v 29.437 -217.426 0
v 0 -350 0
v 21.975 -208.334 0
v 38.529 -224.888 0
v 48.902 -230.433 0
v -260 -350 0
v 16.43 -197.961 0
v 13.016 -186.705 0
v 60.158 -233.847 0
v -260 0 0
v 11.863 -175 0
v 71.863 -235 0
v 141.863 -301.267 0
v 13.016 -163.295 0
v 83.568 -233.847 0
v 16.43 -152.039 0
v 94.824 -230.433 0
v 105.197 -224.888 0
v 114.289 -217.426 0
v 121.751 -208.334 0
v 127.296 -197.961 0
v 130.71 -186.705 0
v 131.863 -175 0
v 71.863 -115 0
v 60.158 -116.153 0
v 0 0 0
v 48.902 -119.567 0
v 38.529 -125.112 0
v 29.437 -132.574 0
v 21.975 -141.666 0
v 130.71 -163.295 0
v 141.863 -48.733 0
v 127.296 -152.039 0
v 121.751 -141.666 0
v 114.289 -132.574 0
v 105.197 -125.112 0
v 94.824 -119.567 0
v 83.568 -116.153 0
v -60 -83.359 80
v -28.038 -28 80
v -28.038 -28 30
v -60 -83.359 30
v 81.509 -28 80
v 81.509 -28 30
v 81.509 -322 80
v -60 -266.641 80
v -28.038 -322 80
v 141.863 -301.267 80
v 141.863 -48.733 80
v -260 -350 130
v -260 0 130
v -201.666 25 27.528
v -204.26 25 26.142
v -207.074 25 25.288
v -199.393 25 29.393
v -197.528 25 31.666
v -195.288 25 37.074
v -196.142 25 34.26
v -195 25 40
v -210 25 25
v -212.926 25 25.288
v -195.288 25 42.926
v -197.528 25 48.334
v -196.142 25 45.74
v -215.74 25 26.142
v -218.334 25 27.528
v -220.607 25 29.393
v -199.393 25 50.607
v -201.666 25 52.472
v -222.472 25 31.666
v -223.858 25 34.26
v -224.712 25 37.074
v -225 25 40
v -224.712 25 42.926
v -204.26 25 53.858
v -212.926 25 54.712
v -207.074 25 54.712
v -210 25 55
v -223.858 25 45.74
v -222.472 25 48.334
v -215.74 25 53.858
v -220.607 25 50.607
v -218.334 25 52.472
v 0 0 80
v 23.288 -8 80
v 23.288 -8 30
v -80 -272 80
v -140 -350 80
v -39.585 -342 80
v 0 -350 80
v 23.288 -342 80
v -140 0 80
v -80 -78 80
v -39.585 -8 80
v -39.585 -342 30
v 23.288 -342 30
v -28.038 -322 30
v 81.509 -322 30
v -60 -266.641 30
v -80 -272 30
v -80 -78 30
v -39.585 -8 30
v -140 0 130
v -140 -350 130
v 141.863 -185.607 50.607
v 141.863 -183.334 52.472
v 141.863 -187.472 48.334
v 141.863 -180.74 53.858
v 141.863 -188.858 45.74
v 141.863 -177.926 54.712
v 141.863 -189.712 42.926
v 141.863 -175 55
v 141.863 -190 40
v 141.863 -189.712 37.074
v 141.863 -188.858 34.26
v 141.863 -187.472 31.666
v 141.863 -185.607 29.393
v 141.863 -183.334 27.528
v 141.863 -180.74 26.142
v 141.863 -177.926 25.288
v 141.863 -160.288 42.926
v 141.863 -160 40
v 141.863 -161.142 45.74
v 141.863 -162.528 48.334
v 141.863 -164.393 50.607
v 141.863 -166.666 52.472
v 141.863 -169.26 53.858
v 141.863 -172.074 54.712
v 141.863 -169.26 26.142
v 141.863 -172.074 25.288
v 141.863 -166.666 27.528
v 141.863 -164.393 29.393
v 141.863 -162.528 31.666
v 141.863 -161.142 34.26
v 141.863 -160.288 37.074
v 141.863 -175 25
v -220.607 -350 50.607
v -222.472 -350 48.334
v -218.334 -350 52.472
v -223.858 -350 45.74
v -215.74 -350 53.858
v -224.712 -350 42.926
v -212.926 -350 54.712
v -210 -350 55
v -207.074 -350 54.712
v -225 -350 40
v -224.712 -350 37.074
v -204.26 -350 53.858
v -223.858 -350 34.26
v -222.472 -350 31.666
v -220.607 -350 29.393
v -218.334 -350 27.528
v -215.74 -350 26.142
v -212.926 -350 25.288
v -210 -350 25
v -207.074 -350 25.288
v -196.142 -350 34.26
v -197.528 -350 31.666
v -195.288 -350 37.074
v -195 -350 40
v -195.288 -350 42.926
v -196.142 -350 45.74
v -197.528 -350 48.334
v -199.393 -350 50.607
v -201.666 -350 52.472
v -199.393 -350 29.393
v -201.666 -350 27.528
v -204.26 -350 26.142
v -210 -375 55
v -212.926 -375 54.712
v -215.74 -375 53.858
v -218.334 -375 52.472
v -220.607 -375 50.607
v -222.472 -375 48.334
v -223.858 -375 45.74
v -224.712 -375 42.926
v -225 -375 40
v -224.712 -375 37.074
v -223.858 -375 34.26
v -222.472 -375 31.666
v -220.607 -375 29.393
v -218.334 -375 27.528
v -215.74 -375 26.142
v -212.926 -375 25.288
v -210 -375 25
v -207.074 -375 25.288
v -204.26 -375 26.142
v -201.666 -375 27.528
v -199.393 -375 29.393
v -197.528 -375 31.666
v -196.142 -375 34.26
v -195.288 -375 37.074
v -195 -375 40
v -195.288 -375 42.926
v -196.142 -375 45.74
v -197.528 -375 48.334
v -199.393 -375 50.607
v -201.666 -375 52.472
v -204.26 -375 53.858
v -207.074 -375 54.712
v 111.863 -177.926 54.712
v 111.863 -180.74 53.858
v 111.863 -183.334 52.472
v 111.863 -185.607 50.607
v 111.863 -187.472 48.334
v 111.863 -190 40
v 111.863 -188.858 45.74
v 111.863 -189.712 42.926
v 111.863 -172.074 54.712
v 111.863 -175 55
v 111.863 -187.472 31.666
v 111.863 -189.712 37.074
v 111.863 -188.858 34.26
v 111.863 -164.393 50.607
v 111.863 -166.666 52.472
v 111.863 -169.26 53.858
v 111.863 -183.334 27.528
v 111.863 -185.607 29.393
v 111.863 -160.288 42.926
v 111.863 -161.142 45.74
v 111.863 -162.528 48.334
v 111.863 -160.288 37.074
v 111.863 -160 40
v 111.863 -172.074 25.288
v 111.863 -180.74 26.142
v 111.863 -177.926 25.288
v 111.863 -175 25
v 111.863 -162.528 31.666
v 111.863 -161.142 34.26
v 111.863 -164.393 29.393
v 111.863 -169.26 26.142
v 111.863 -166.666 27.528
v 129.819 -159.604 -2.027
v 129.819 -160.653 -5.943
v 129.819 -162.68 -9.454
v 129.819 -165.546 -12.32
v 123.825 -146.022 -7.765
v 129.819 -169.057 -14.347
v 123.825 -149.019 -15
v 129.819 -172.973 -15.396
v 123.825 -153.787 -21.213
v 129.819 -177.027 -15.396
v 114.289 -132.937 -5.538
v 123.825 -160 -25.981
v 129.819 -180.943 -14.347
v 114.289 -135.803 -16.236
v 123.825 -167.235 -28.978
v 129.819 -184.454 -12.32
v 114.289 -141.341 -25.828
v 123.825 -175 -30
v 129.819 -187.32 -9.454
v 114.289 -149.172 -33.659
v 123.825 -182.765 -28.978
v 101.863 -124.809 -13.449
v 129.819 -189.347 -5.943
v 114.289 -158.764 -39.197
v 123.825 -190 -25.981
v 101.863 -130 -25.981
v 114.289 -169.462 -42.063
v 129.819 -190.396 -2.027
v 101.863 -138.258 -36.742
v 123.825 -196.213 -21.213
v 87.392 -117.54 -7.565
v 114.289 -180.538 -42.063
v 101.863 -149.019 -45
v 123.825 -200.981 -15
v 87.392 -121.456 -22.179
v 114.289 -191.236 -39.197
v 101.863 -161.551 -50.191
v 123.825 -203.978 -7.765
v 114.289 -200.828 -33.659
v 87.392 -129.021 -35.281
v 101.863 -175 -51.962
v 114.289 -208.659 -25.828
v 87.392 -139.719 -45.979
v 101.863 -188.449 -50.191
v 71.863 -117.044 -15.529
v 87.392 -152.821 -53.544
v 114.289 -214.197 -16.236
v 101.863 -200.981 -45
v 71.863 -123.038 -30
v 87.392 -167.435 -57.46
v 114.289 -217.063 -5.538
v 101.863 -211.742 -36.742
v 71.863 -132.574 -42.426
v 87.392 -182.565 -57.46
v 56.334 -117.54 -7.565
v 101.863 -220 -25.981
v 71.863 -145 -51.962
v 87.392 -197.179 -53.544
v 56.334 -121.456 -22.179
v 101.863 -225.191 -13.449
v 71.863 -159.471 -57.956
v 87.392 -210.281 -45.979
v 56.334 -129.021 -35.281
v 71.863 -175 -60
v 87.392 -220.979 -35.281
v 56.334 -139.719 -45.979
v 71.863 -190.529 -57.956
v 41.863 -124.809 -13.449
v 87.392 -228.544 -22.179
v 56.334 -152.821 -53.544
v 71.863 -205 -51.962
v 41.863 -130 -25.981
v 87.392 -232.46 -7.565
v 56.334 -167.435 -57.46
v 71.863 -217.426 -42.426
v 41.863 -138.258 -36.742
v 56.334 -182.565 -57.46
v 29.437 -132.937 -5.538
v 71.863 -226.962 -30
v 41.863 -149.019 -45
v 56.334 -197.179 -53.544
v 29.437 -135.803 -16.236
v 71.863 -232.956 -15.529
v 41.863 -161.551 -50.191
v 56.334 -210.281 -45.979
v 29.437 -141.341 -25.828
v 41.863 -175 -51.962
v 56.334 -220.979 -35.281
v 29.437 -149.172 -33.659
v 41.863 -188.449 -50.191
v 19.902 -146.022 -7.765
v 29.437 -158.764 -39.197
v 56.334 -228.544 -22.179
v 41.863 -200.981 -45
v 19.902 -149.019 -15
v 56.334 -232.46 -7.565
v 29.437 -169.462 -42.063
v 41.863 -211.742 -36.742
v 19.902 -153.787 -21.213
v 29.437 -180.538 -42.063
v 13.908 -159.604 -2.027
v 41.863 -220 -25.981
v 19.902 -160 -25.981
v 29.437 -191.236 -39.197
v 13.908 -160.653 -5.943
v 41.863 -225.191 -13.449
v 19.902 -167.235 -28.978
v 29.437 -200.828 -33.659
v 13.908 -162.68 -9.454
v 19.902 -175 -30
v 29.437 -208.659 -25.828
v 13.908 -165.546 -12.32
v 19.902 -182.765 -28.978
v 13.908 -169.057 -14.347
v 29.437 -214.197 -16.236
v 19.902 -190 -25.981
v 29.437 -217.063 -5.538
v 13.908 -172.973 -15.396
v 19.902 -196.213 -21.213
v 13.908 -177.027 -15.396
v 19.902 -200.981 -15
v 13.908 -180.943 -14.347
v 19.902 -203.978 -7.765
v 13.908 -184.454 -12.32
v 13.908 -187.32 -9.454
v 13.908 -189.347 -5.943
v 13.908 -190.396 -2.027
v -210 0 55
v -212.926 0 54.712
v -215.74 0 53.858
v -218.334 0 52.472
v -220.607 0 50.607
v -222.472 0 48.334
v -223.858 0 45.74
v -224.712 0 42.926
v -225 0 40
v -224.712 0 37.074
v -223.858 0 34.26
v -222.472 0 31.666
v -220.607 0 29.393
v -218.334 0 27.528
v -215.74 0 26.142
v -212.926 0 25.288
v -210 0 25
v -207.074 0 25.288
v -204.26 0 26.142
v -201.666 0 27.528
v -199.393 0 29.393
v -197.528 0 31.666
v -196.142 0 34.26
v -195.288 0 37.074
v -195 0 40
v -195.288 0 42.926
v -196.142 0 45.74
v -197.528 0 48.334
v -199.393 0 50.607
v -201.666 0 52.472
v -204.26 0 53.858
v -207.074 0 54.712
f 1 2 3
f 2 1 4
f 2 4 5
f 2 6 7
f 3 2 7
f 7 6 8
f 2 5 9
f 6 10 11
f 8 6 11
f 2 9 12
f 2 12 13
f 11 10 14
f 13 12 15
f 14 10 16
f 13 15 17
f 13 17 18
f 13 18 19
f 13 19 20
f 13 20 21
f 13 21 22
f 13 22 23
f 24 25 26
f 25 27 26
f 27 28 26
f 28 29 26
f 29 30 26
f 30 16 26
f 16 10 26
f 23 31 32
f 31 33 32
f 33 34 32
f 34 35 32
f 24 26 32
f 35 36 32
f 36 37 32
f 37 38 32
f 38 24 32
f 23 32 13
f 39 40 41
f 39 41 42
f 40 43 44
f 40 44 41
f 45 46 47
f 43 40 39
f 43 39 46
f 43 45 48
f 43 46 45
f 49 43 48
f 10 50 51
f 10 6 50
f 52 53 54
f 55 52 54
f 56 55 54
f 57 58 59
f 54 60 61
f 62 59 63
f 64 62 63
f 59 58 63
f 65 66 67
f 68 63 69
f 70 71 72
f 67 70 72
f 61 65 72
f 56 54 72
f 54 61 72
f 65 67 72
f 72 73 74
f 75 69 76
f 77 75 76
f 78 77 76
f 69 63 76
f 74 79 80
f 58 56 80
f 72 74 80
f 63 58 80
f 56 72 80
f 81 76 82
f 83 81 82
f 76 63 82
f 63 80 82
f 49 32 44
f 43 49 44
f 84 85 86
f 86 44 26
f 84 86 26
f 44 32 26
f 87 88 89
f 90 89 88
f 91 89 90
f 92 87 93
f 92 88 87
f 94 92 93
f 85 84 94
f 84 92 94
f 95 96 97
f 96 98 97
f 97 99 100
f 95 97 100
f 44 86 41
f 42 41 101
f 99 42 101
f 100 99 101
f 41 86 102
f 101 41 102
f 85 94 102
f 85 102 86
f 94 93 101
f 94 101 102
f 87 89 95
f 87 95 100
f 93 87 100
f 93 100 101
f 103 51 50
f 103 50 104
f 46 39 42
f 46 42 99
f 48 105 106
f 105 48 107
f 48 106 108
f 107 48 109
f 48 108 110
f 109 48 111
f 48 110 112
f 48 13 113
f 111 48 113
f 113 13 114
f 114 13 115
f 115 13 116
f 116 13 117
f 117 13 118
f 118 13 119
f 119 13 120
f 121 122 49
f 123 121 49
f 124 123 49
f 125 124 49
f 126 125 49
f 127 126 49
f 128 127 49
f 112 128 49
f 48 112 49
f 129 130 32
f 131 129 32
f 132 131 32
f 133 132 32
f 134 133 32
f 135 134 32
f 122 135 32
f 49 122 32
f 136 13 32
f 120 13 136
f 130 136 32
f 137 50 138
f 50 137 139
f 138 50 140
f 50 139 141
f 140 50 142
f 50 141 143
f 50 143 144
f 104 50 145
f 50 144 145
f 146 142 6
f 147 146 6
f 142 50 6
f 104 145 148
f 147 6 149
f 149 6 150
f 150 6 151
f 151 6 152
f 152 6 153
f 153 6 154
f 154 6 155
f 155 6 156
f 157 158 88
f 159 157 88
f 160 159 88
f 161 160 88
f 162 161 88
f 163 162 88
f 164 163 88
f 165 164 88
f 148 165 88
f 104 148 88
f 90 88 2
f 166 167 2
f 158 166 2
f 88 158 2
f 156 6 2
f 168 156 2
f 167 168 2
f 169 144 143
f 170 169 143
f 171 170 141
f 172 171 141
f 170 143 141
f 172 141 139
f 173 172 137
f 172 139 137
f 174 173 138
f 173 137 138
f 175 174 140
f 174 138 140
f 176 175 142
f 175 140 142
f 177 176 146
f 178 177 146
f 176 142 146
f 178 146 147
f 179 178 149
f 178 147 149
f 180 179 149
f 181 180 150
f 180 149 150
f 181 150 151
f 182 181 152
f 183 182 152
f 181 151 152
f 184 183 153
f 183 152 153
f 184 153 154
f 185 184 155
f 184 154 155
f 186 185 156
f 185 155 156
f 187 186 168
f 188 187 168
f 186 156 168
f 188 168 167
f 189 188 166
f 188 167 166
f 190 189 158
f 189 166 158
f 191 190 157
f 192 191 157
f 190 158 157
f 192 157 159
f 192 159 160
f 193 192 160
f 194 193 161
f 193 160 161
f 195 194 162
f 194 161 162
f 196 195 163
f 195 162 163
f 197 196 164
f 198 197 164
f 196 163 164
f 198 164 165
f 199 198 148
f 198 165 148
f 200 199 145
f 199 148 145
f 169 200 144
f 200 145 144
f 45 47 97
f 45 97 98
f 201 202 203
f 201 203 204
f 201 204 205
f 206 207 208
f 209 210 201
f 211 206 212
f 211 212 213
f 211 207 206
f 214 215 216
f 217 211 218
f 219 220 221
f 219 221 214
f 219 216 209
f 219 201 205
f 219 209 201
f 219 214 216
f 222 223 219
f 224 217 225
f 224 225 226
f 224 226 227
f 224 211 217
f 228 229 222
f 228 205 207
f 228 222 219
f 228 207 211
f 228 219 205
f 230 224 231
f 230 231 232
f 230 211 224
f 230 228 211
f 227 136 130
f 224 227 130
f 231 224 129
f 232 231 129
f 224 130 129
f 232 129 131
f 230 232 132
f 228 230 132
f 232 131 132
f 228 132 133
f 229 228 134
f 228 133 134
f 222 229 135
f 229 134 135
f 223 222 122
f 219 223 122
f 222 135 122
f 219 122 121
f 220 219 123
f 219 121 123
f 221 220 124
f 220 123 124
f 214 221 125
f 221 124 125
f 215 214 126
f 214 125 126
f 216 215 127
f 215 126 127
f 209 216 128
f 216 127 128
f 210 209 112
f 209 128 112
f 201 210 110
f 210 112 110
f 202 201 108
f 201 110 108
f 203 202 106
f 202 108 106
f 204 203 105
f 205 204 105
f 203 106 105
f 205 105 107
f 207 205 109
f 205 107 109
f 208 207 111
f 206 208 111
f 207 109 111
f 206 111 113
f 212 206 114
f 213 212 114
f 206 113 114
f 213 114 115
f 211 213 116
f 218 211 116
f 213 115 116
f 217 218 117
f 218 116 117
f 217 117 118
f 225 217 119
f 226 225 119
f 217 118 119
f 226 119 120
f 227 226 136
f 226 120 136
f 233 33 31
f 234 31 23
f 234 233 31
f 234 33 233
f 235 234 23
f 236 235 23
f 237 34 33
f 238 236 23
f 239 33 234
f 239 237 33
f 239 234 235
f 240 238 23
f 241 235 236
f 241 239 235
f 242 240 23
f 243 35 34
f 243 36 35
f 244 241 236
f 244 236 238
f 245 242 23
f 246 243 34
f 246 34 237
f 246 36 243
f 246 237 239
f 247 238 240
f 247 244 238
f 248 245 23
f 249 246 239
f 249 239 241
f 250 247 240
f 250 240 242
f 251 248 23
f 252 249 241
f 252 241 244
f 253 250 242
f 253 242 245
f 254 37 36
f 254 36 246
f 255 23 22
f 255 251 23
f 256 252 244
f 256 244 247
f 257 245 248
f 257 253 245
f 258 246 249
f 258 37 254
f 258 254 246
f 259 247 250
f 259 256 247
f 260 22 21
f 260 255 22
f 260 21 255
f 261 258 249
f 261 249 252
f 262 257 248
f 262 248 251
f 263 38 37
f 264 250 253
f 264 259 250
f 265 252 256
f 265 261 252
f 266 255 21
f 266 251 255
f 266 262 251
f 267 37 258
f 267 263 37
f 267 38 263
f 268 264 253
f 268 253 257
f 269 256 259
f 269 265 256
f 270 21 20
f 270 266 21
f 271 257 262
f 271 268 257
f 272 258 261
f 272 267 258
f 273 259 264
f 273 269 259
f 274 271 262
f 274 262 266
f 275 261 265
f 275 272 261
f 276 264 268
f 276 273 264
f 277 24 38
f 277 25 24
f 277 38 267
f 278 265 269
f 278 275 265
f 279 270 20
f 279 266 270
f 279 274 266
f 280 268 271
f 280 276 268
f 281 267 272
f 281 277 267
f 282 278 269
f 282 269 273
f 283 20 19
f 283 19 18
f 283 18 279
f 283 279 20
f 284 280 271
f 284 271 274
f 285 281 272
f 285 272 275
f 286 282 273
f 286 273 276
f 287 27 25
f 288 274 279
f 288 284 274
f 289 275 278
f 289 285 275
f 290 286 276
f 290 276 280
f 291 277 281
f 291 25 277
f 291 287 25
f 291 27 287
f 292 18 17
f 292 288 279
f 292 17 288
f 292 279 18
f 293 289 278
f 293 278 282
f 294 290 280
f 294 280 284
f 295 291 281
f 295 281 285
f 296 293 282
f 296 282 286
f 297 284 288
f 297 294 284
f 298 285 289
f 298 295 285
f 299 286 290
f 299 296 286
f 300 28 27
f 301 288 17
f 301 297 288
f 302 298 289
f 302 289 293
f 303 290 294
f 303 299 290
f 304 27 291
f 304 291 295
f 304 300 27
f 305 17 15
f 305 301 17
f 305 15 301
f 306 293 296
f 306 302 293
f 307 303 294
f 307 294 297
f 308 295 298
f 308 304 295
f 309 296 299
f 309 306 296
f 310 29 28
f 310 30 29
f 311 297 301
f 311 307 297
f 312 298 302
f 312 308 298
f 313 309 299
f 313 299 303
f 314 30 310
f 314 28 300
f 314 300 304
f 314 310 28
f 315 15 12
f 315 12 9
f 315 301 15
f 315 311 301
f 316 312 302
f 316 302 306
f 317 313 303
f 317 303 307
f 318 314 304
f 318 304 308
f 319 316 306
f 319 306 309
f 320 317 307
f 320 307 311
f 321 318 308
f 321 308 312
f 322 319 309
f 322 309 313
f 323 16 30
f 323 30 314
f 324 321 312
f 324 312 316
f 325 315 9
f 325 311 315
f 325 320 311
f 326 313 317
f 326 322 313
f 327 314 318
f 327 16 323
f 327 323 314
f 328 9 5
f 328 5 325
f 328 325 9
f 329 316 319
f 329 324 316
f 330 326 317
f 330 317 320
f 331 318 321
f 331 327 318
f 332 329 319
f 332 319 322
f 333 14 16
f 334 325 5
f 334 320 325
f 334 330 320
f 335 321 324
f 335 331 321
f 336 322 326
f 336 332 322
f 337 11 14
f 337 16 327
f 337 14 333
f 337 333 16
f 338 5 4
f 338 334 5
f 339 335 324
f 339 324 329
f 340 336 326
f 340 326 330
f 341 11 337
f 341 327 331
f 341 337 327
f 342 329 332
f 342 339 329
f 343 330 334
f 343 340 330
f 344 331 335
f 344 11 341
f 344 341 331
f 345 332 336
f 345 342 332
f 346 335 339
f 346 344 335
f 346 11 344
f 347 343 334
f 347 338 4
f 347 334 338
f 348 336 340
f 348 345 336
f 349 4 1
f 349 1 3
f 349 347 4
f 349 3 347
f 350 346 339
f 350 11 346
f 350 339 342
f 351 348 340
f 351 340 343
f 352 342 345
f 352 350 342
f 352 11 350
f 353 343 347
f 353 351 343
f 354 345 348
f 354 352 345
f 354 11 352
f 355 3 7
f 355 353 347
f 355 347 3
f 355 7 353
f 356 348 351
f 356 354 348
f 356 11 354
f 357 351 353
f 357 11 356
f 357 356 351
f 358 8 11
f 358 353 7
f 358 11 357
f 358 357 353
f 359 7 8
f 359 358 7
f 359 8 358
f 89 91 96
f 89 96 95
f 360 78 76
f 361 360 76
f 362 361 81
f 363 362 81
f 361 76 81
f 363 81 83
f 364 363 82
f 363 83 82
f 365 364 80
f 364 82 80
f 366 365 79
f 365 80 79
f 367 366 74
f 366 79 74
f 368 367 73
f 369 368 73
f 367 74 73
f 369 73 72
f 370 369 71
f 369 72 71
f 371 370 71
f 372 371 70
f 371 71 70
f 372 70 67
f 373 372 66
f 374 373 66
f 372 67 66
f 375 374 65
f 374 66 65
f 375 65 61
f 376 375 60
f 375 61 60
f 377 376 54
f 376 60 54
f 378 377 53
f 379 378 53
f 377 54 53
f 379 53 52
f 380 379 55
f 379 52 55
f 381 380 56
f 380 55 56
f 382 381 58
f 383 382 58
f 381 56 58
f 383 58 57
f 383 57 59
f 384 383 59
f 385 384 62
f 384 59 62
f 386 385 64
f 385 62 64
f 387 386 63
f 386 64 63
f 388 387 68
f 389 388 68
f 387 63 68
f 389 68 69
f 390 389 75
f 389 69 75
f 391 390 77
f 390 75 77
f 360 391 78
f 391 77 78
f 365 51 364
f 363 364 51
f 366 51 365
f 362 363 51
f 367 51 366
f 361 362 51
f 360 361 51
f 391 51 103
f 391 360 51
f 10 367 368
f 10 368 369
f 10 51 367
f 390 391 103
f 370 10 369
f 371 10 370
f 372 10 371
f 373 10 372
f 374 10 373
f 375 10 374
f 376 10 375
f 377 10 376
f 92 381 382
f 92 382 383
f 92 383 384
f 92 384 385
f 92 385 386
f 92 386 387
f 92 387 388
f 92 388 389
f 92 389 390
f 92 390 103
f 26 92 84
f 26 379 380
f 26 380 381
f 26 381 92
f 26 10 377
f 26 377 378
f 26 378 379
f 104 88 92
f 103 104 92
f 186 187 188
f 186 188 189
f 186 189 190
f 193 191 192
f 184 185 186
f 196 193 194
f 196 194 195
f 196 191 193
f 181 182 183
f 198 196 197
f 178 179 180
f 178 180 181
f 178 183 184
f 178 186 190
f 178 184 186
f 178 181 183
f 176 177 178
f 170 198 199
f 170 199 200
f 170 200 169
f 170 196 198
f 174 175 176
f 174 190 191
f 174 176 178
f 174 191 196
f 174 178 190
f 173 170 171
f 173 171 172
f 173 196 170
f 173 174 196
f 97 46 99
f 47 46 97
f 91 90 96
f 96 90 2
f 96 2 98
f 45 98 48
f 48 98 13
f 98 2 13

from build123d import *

# Parameters (mm, degrees)
BOSS_EXTRUDE1_DEPTH = 80
SKETCH2_R           = 15
BOSS_EXTRUDE2_DEPTH = 25
BOSS_EXTRUDE3_START = -375
SKETCH2_2_R         = 15
BOSS_EXTRUDE3_DEPTH = 25
SKETCH4_R           = 15
CUT_EXTRUDE1_DEPTH  = 30
CUT_EXTRUDE3_DEPTH  = 50
REVOLVE1_ANGLE      = 180
SKETCH6_W           = 120
SKETCH6_H           = 350
BOSS_EXTRUDE4_DEPTH = 50


with BuildPart() as part:
    # Sketch1 → Boss-Extrude1 (new body)
    with BuildSketch(Plane.XY):
        Polygon((0, 0), (-260, 0), (-260, -350), (0, -350), (141.863078537, -301.267393379), (141.863078537, -48.732606621), align=None)
    extrude(amount=BOSS_EXTRUDE1_DEPTH)

    # Sketch2 → Boss-Extrude2 (add)
    with BuildSketch(Plane.XZ.offset(350)):
        with Locations(Location((-210, 40, 0), (0, 0, 90))):
            Circle(SKETCH2_R)
    extrude(amount=BOSS_EXTRUDE2_DEPTH)

    # Sketch2<2> → Boss-Extrude3 (add)
    with BuildSketch(Plane.XZ.offset(350).offset(BOSS_EXTRUDE3_START)):
        with Locations(Location((-210, 40, 0), (0, 0, 90))):
            Circle(SKETCH2_2_R)
    extrude(amount=BOSS_EXTRUDE3_DEPTH)

    # Sketch4 → Cut-Extrude1 (cut)
    with BuildSketch(Plane(origin=(141.863078537, 0, 0), x_dir=(0, 0, -1), z_dir=(1, 0, 0))):
        with Locations((-40, -175)):
            Circle(SKETCH4_R)
    extrude(amount=-CUT_EXTRUDE1_DEPTH, mode=Mode.SUBTRACT)

    # Sketch5 → Cut-Extrude3 (cut)
    with BuildSketch(Plane.XY.offset(80)):
        Polygon((23.288403945, -342), (-39.585481157, -342), (-80, -272), (-80, -78), (-39.585481157, -8), (23.288403945, -8), (81.509413808, -28), (-28.038475773, -28), (-60, -83.358983849), (-60, -266.641016151), (-28.038475773, -322), (81.509413808, -322), align=None)
    extrude(amount=-CUT_EXTRUDE3_DEPTH, mode=Mode.SUBTRACT)

    # Sketch3 → Revolve1 (revolve)
    with BuildSketch(Plane(origin=(0, 0, 0), x_dir=(-1, 0, 0), z_dir=(0, 0, -1))):
        with BuildLine():
            Line((-11.863078537, -175), (-131.863078537, -175))
            ThreePointArc((-131.863078537, -175), (-71.863078537, -115), (-11.863078537, -175))
        make_face()
    revolve(axis=Axis((141.863078537, -175, 0), (-1, 0, 0)), revolution_arc=REVOLVE1_ANGLE)

    # Sketch6 → Boss-Extrude4 (add)
    with BuildSketch(Plane.XY.offset(80)):
        with Locations((-200, -175)):
            Rectangle(SKETCH6_W, SKETCH6_H)
    extrude(amount=BOSS_EXTRUDE4_DEPTH)


solid = part.part
